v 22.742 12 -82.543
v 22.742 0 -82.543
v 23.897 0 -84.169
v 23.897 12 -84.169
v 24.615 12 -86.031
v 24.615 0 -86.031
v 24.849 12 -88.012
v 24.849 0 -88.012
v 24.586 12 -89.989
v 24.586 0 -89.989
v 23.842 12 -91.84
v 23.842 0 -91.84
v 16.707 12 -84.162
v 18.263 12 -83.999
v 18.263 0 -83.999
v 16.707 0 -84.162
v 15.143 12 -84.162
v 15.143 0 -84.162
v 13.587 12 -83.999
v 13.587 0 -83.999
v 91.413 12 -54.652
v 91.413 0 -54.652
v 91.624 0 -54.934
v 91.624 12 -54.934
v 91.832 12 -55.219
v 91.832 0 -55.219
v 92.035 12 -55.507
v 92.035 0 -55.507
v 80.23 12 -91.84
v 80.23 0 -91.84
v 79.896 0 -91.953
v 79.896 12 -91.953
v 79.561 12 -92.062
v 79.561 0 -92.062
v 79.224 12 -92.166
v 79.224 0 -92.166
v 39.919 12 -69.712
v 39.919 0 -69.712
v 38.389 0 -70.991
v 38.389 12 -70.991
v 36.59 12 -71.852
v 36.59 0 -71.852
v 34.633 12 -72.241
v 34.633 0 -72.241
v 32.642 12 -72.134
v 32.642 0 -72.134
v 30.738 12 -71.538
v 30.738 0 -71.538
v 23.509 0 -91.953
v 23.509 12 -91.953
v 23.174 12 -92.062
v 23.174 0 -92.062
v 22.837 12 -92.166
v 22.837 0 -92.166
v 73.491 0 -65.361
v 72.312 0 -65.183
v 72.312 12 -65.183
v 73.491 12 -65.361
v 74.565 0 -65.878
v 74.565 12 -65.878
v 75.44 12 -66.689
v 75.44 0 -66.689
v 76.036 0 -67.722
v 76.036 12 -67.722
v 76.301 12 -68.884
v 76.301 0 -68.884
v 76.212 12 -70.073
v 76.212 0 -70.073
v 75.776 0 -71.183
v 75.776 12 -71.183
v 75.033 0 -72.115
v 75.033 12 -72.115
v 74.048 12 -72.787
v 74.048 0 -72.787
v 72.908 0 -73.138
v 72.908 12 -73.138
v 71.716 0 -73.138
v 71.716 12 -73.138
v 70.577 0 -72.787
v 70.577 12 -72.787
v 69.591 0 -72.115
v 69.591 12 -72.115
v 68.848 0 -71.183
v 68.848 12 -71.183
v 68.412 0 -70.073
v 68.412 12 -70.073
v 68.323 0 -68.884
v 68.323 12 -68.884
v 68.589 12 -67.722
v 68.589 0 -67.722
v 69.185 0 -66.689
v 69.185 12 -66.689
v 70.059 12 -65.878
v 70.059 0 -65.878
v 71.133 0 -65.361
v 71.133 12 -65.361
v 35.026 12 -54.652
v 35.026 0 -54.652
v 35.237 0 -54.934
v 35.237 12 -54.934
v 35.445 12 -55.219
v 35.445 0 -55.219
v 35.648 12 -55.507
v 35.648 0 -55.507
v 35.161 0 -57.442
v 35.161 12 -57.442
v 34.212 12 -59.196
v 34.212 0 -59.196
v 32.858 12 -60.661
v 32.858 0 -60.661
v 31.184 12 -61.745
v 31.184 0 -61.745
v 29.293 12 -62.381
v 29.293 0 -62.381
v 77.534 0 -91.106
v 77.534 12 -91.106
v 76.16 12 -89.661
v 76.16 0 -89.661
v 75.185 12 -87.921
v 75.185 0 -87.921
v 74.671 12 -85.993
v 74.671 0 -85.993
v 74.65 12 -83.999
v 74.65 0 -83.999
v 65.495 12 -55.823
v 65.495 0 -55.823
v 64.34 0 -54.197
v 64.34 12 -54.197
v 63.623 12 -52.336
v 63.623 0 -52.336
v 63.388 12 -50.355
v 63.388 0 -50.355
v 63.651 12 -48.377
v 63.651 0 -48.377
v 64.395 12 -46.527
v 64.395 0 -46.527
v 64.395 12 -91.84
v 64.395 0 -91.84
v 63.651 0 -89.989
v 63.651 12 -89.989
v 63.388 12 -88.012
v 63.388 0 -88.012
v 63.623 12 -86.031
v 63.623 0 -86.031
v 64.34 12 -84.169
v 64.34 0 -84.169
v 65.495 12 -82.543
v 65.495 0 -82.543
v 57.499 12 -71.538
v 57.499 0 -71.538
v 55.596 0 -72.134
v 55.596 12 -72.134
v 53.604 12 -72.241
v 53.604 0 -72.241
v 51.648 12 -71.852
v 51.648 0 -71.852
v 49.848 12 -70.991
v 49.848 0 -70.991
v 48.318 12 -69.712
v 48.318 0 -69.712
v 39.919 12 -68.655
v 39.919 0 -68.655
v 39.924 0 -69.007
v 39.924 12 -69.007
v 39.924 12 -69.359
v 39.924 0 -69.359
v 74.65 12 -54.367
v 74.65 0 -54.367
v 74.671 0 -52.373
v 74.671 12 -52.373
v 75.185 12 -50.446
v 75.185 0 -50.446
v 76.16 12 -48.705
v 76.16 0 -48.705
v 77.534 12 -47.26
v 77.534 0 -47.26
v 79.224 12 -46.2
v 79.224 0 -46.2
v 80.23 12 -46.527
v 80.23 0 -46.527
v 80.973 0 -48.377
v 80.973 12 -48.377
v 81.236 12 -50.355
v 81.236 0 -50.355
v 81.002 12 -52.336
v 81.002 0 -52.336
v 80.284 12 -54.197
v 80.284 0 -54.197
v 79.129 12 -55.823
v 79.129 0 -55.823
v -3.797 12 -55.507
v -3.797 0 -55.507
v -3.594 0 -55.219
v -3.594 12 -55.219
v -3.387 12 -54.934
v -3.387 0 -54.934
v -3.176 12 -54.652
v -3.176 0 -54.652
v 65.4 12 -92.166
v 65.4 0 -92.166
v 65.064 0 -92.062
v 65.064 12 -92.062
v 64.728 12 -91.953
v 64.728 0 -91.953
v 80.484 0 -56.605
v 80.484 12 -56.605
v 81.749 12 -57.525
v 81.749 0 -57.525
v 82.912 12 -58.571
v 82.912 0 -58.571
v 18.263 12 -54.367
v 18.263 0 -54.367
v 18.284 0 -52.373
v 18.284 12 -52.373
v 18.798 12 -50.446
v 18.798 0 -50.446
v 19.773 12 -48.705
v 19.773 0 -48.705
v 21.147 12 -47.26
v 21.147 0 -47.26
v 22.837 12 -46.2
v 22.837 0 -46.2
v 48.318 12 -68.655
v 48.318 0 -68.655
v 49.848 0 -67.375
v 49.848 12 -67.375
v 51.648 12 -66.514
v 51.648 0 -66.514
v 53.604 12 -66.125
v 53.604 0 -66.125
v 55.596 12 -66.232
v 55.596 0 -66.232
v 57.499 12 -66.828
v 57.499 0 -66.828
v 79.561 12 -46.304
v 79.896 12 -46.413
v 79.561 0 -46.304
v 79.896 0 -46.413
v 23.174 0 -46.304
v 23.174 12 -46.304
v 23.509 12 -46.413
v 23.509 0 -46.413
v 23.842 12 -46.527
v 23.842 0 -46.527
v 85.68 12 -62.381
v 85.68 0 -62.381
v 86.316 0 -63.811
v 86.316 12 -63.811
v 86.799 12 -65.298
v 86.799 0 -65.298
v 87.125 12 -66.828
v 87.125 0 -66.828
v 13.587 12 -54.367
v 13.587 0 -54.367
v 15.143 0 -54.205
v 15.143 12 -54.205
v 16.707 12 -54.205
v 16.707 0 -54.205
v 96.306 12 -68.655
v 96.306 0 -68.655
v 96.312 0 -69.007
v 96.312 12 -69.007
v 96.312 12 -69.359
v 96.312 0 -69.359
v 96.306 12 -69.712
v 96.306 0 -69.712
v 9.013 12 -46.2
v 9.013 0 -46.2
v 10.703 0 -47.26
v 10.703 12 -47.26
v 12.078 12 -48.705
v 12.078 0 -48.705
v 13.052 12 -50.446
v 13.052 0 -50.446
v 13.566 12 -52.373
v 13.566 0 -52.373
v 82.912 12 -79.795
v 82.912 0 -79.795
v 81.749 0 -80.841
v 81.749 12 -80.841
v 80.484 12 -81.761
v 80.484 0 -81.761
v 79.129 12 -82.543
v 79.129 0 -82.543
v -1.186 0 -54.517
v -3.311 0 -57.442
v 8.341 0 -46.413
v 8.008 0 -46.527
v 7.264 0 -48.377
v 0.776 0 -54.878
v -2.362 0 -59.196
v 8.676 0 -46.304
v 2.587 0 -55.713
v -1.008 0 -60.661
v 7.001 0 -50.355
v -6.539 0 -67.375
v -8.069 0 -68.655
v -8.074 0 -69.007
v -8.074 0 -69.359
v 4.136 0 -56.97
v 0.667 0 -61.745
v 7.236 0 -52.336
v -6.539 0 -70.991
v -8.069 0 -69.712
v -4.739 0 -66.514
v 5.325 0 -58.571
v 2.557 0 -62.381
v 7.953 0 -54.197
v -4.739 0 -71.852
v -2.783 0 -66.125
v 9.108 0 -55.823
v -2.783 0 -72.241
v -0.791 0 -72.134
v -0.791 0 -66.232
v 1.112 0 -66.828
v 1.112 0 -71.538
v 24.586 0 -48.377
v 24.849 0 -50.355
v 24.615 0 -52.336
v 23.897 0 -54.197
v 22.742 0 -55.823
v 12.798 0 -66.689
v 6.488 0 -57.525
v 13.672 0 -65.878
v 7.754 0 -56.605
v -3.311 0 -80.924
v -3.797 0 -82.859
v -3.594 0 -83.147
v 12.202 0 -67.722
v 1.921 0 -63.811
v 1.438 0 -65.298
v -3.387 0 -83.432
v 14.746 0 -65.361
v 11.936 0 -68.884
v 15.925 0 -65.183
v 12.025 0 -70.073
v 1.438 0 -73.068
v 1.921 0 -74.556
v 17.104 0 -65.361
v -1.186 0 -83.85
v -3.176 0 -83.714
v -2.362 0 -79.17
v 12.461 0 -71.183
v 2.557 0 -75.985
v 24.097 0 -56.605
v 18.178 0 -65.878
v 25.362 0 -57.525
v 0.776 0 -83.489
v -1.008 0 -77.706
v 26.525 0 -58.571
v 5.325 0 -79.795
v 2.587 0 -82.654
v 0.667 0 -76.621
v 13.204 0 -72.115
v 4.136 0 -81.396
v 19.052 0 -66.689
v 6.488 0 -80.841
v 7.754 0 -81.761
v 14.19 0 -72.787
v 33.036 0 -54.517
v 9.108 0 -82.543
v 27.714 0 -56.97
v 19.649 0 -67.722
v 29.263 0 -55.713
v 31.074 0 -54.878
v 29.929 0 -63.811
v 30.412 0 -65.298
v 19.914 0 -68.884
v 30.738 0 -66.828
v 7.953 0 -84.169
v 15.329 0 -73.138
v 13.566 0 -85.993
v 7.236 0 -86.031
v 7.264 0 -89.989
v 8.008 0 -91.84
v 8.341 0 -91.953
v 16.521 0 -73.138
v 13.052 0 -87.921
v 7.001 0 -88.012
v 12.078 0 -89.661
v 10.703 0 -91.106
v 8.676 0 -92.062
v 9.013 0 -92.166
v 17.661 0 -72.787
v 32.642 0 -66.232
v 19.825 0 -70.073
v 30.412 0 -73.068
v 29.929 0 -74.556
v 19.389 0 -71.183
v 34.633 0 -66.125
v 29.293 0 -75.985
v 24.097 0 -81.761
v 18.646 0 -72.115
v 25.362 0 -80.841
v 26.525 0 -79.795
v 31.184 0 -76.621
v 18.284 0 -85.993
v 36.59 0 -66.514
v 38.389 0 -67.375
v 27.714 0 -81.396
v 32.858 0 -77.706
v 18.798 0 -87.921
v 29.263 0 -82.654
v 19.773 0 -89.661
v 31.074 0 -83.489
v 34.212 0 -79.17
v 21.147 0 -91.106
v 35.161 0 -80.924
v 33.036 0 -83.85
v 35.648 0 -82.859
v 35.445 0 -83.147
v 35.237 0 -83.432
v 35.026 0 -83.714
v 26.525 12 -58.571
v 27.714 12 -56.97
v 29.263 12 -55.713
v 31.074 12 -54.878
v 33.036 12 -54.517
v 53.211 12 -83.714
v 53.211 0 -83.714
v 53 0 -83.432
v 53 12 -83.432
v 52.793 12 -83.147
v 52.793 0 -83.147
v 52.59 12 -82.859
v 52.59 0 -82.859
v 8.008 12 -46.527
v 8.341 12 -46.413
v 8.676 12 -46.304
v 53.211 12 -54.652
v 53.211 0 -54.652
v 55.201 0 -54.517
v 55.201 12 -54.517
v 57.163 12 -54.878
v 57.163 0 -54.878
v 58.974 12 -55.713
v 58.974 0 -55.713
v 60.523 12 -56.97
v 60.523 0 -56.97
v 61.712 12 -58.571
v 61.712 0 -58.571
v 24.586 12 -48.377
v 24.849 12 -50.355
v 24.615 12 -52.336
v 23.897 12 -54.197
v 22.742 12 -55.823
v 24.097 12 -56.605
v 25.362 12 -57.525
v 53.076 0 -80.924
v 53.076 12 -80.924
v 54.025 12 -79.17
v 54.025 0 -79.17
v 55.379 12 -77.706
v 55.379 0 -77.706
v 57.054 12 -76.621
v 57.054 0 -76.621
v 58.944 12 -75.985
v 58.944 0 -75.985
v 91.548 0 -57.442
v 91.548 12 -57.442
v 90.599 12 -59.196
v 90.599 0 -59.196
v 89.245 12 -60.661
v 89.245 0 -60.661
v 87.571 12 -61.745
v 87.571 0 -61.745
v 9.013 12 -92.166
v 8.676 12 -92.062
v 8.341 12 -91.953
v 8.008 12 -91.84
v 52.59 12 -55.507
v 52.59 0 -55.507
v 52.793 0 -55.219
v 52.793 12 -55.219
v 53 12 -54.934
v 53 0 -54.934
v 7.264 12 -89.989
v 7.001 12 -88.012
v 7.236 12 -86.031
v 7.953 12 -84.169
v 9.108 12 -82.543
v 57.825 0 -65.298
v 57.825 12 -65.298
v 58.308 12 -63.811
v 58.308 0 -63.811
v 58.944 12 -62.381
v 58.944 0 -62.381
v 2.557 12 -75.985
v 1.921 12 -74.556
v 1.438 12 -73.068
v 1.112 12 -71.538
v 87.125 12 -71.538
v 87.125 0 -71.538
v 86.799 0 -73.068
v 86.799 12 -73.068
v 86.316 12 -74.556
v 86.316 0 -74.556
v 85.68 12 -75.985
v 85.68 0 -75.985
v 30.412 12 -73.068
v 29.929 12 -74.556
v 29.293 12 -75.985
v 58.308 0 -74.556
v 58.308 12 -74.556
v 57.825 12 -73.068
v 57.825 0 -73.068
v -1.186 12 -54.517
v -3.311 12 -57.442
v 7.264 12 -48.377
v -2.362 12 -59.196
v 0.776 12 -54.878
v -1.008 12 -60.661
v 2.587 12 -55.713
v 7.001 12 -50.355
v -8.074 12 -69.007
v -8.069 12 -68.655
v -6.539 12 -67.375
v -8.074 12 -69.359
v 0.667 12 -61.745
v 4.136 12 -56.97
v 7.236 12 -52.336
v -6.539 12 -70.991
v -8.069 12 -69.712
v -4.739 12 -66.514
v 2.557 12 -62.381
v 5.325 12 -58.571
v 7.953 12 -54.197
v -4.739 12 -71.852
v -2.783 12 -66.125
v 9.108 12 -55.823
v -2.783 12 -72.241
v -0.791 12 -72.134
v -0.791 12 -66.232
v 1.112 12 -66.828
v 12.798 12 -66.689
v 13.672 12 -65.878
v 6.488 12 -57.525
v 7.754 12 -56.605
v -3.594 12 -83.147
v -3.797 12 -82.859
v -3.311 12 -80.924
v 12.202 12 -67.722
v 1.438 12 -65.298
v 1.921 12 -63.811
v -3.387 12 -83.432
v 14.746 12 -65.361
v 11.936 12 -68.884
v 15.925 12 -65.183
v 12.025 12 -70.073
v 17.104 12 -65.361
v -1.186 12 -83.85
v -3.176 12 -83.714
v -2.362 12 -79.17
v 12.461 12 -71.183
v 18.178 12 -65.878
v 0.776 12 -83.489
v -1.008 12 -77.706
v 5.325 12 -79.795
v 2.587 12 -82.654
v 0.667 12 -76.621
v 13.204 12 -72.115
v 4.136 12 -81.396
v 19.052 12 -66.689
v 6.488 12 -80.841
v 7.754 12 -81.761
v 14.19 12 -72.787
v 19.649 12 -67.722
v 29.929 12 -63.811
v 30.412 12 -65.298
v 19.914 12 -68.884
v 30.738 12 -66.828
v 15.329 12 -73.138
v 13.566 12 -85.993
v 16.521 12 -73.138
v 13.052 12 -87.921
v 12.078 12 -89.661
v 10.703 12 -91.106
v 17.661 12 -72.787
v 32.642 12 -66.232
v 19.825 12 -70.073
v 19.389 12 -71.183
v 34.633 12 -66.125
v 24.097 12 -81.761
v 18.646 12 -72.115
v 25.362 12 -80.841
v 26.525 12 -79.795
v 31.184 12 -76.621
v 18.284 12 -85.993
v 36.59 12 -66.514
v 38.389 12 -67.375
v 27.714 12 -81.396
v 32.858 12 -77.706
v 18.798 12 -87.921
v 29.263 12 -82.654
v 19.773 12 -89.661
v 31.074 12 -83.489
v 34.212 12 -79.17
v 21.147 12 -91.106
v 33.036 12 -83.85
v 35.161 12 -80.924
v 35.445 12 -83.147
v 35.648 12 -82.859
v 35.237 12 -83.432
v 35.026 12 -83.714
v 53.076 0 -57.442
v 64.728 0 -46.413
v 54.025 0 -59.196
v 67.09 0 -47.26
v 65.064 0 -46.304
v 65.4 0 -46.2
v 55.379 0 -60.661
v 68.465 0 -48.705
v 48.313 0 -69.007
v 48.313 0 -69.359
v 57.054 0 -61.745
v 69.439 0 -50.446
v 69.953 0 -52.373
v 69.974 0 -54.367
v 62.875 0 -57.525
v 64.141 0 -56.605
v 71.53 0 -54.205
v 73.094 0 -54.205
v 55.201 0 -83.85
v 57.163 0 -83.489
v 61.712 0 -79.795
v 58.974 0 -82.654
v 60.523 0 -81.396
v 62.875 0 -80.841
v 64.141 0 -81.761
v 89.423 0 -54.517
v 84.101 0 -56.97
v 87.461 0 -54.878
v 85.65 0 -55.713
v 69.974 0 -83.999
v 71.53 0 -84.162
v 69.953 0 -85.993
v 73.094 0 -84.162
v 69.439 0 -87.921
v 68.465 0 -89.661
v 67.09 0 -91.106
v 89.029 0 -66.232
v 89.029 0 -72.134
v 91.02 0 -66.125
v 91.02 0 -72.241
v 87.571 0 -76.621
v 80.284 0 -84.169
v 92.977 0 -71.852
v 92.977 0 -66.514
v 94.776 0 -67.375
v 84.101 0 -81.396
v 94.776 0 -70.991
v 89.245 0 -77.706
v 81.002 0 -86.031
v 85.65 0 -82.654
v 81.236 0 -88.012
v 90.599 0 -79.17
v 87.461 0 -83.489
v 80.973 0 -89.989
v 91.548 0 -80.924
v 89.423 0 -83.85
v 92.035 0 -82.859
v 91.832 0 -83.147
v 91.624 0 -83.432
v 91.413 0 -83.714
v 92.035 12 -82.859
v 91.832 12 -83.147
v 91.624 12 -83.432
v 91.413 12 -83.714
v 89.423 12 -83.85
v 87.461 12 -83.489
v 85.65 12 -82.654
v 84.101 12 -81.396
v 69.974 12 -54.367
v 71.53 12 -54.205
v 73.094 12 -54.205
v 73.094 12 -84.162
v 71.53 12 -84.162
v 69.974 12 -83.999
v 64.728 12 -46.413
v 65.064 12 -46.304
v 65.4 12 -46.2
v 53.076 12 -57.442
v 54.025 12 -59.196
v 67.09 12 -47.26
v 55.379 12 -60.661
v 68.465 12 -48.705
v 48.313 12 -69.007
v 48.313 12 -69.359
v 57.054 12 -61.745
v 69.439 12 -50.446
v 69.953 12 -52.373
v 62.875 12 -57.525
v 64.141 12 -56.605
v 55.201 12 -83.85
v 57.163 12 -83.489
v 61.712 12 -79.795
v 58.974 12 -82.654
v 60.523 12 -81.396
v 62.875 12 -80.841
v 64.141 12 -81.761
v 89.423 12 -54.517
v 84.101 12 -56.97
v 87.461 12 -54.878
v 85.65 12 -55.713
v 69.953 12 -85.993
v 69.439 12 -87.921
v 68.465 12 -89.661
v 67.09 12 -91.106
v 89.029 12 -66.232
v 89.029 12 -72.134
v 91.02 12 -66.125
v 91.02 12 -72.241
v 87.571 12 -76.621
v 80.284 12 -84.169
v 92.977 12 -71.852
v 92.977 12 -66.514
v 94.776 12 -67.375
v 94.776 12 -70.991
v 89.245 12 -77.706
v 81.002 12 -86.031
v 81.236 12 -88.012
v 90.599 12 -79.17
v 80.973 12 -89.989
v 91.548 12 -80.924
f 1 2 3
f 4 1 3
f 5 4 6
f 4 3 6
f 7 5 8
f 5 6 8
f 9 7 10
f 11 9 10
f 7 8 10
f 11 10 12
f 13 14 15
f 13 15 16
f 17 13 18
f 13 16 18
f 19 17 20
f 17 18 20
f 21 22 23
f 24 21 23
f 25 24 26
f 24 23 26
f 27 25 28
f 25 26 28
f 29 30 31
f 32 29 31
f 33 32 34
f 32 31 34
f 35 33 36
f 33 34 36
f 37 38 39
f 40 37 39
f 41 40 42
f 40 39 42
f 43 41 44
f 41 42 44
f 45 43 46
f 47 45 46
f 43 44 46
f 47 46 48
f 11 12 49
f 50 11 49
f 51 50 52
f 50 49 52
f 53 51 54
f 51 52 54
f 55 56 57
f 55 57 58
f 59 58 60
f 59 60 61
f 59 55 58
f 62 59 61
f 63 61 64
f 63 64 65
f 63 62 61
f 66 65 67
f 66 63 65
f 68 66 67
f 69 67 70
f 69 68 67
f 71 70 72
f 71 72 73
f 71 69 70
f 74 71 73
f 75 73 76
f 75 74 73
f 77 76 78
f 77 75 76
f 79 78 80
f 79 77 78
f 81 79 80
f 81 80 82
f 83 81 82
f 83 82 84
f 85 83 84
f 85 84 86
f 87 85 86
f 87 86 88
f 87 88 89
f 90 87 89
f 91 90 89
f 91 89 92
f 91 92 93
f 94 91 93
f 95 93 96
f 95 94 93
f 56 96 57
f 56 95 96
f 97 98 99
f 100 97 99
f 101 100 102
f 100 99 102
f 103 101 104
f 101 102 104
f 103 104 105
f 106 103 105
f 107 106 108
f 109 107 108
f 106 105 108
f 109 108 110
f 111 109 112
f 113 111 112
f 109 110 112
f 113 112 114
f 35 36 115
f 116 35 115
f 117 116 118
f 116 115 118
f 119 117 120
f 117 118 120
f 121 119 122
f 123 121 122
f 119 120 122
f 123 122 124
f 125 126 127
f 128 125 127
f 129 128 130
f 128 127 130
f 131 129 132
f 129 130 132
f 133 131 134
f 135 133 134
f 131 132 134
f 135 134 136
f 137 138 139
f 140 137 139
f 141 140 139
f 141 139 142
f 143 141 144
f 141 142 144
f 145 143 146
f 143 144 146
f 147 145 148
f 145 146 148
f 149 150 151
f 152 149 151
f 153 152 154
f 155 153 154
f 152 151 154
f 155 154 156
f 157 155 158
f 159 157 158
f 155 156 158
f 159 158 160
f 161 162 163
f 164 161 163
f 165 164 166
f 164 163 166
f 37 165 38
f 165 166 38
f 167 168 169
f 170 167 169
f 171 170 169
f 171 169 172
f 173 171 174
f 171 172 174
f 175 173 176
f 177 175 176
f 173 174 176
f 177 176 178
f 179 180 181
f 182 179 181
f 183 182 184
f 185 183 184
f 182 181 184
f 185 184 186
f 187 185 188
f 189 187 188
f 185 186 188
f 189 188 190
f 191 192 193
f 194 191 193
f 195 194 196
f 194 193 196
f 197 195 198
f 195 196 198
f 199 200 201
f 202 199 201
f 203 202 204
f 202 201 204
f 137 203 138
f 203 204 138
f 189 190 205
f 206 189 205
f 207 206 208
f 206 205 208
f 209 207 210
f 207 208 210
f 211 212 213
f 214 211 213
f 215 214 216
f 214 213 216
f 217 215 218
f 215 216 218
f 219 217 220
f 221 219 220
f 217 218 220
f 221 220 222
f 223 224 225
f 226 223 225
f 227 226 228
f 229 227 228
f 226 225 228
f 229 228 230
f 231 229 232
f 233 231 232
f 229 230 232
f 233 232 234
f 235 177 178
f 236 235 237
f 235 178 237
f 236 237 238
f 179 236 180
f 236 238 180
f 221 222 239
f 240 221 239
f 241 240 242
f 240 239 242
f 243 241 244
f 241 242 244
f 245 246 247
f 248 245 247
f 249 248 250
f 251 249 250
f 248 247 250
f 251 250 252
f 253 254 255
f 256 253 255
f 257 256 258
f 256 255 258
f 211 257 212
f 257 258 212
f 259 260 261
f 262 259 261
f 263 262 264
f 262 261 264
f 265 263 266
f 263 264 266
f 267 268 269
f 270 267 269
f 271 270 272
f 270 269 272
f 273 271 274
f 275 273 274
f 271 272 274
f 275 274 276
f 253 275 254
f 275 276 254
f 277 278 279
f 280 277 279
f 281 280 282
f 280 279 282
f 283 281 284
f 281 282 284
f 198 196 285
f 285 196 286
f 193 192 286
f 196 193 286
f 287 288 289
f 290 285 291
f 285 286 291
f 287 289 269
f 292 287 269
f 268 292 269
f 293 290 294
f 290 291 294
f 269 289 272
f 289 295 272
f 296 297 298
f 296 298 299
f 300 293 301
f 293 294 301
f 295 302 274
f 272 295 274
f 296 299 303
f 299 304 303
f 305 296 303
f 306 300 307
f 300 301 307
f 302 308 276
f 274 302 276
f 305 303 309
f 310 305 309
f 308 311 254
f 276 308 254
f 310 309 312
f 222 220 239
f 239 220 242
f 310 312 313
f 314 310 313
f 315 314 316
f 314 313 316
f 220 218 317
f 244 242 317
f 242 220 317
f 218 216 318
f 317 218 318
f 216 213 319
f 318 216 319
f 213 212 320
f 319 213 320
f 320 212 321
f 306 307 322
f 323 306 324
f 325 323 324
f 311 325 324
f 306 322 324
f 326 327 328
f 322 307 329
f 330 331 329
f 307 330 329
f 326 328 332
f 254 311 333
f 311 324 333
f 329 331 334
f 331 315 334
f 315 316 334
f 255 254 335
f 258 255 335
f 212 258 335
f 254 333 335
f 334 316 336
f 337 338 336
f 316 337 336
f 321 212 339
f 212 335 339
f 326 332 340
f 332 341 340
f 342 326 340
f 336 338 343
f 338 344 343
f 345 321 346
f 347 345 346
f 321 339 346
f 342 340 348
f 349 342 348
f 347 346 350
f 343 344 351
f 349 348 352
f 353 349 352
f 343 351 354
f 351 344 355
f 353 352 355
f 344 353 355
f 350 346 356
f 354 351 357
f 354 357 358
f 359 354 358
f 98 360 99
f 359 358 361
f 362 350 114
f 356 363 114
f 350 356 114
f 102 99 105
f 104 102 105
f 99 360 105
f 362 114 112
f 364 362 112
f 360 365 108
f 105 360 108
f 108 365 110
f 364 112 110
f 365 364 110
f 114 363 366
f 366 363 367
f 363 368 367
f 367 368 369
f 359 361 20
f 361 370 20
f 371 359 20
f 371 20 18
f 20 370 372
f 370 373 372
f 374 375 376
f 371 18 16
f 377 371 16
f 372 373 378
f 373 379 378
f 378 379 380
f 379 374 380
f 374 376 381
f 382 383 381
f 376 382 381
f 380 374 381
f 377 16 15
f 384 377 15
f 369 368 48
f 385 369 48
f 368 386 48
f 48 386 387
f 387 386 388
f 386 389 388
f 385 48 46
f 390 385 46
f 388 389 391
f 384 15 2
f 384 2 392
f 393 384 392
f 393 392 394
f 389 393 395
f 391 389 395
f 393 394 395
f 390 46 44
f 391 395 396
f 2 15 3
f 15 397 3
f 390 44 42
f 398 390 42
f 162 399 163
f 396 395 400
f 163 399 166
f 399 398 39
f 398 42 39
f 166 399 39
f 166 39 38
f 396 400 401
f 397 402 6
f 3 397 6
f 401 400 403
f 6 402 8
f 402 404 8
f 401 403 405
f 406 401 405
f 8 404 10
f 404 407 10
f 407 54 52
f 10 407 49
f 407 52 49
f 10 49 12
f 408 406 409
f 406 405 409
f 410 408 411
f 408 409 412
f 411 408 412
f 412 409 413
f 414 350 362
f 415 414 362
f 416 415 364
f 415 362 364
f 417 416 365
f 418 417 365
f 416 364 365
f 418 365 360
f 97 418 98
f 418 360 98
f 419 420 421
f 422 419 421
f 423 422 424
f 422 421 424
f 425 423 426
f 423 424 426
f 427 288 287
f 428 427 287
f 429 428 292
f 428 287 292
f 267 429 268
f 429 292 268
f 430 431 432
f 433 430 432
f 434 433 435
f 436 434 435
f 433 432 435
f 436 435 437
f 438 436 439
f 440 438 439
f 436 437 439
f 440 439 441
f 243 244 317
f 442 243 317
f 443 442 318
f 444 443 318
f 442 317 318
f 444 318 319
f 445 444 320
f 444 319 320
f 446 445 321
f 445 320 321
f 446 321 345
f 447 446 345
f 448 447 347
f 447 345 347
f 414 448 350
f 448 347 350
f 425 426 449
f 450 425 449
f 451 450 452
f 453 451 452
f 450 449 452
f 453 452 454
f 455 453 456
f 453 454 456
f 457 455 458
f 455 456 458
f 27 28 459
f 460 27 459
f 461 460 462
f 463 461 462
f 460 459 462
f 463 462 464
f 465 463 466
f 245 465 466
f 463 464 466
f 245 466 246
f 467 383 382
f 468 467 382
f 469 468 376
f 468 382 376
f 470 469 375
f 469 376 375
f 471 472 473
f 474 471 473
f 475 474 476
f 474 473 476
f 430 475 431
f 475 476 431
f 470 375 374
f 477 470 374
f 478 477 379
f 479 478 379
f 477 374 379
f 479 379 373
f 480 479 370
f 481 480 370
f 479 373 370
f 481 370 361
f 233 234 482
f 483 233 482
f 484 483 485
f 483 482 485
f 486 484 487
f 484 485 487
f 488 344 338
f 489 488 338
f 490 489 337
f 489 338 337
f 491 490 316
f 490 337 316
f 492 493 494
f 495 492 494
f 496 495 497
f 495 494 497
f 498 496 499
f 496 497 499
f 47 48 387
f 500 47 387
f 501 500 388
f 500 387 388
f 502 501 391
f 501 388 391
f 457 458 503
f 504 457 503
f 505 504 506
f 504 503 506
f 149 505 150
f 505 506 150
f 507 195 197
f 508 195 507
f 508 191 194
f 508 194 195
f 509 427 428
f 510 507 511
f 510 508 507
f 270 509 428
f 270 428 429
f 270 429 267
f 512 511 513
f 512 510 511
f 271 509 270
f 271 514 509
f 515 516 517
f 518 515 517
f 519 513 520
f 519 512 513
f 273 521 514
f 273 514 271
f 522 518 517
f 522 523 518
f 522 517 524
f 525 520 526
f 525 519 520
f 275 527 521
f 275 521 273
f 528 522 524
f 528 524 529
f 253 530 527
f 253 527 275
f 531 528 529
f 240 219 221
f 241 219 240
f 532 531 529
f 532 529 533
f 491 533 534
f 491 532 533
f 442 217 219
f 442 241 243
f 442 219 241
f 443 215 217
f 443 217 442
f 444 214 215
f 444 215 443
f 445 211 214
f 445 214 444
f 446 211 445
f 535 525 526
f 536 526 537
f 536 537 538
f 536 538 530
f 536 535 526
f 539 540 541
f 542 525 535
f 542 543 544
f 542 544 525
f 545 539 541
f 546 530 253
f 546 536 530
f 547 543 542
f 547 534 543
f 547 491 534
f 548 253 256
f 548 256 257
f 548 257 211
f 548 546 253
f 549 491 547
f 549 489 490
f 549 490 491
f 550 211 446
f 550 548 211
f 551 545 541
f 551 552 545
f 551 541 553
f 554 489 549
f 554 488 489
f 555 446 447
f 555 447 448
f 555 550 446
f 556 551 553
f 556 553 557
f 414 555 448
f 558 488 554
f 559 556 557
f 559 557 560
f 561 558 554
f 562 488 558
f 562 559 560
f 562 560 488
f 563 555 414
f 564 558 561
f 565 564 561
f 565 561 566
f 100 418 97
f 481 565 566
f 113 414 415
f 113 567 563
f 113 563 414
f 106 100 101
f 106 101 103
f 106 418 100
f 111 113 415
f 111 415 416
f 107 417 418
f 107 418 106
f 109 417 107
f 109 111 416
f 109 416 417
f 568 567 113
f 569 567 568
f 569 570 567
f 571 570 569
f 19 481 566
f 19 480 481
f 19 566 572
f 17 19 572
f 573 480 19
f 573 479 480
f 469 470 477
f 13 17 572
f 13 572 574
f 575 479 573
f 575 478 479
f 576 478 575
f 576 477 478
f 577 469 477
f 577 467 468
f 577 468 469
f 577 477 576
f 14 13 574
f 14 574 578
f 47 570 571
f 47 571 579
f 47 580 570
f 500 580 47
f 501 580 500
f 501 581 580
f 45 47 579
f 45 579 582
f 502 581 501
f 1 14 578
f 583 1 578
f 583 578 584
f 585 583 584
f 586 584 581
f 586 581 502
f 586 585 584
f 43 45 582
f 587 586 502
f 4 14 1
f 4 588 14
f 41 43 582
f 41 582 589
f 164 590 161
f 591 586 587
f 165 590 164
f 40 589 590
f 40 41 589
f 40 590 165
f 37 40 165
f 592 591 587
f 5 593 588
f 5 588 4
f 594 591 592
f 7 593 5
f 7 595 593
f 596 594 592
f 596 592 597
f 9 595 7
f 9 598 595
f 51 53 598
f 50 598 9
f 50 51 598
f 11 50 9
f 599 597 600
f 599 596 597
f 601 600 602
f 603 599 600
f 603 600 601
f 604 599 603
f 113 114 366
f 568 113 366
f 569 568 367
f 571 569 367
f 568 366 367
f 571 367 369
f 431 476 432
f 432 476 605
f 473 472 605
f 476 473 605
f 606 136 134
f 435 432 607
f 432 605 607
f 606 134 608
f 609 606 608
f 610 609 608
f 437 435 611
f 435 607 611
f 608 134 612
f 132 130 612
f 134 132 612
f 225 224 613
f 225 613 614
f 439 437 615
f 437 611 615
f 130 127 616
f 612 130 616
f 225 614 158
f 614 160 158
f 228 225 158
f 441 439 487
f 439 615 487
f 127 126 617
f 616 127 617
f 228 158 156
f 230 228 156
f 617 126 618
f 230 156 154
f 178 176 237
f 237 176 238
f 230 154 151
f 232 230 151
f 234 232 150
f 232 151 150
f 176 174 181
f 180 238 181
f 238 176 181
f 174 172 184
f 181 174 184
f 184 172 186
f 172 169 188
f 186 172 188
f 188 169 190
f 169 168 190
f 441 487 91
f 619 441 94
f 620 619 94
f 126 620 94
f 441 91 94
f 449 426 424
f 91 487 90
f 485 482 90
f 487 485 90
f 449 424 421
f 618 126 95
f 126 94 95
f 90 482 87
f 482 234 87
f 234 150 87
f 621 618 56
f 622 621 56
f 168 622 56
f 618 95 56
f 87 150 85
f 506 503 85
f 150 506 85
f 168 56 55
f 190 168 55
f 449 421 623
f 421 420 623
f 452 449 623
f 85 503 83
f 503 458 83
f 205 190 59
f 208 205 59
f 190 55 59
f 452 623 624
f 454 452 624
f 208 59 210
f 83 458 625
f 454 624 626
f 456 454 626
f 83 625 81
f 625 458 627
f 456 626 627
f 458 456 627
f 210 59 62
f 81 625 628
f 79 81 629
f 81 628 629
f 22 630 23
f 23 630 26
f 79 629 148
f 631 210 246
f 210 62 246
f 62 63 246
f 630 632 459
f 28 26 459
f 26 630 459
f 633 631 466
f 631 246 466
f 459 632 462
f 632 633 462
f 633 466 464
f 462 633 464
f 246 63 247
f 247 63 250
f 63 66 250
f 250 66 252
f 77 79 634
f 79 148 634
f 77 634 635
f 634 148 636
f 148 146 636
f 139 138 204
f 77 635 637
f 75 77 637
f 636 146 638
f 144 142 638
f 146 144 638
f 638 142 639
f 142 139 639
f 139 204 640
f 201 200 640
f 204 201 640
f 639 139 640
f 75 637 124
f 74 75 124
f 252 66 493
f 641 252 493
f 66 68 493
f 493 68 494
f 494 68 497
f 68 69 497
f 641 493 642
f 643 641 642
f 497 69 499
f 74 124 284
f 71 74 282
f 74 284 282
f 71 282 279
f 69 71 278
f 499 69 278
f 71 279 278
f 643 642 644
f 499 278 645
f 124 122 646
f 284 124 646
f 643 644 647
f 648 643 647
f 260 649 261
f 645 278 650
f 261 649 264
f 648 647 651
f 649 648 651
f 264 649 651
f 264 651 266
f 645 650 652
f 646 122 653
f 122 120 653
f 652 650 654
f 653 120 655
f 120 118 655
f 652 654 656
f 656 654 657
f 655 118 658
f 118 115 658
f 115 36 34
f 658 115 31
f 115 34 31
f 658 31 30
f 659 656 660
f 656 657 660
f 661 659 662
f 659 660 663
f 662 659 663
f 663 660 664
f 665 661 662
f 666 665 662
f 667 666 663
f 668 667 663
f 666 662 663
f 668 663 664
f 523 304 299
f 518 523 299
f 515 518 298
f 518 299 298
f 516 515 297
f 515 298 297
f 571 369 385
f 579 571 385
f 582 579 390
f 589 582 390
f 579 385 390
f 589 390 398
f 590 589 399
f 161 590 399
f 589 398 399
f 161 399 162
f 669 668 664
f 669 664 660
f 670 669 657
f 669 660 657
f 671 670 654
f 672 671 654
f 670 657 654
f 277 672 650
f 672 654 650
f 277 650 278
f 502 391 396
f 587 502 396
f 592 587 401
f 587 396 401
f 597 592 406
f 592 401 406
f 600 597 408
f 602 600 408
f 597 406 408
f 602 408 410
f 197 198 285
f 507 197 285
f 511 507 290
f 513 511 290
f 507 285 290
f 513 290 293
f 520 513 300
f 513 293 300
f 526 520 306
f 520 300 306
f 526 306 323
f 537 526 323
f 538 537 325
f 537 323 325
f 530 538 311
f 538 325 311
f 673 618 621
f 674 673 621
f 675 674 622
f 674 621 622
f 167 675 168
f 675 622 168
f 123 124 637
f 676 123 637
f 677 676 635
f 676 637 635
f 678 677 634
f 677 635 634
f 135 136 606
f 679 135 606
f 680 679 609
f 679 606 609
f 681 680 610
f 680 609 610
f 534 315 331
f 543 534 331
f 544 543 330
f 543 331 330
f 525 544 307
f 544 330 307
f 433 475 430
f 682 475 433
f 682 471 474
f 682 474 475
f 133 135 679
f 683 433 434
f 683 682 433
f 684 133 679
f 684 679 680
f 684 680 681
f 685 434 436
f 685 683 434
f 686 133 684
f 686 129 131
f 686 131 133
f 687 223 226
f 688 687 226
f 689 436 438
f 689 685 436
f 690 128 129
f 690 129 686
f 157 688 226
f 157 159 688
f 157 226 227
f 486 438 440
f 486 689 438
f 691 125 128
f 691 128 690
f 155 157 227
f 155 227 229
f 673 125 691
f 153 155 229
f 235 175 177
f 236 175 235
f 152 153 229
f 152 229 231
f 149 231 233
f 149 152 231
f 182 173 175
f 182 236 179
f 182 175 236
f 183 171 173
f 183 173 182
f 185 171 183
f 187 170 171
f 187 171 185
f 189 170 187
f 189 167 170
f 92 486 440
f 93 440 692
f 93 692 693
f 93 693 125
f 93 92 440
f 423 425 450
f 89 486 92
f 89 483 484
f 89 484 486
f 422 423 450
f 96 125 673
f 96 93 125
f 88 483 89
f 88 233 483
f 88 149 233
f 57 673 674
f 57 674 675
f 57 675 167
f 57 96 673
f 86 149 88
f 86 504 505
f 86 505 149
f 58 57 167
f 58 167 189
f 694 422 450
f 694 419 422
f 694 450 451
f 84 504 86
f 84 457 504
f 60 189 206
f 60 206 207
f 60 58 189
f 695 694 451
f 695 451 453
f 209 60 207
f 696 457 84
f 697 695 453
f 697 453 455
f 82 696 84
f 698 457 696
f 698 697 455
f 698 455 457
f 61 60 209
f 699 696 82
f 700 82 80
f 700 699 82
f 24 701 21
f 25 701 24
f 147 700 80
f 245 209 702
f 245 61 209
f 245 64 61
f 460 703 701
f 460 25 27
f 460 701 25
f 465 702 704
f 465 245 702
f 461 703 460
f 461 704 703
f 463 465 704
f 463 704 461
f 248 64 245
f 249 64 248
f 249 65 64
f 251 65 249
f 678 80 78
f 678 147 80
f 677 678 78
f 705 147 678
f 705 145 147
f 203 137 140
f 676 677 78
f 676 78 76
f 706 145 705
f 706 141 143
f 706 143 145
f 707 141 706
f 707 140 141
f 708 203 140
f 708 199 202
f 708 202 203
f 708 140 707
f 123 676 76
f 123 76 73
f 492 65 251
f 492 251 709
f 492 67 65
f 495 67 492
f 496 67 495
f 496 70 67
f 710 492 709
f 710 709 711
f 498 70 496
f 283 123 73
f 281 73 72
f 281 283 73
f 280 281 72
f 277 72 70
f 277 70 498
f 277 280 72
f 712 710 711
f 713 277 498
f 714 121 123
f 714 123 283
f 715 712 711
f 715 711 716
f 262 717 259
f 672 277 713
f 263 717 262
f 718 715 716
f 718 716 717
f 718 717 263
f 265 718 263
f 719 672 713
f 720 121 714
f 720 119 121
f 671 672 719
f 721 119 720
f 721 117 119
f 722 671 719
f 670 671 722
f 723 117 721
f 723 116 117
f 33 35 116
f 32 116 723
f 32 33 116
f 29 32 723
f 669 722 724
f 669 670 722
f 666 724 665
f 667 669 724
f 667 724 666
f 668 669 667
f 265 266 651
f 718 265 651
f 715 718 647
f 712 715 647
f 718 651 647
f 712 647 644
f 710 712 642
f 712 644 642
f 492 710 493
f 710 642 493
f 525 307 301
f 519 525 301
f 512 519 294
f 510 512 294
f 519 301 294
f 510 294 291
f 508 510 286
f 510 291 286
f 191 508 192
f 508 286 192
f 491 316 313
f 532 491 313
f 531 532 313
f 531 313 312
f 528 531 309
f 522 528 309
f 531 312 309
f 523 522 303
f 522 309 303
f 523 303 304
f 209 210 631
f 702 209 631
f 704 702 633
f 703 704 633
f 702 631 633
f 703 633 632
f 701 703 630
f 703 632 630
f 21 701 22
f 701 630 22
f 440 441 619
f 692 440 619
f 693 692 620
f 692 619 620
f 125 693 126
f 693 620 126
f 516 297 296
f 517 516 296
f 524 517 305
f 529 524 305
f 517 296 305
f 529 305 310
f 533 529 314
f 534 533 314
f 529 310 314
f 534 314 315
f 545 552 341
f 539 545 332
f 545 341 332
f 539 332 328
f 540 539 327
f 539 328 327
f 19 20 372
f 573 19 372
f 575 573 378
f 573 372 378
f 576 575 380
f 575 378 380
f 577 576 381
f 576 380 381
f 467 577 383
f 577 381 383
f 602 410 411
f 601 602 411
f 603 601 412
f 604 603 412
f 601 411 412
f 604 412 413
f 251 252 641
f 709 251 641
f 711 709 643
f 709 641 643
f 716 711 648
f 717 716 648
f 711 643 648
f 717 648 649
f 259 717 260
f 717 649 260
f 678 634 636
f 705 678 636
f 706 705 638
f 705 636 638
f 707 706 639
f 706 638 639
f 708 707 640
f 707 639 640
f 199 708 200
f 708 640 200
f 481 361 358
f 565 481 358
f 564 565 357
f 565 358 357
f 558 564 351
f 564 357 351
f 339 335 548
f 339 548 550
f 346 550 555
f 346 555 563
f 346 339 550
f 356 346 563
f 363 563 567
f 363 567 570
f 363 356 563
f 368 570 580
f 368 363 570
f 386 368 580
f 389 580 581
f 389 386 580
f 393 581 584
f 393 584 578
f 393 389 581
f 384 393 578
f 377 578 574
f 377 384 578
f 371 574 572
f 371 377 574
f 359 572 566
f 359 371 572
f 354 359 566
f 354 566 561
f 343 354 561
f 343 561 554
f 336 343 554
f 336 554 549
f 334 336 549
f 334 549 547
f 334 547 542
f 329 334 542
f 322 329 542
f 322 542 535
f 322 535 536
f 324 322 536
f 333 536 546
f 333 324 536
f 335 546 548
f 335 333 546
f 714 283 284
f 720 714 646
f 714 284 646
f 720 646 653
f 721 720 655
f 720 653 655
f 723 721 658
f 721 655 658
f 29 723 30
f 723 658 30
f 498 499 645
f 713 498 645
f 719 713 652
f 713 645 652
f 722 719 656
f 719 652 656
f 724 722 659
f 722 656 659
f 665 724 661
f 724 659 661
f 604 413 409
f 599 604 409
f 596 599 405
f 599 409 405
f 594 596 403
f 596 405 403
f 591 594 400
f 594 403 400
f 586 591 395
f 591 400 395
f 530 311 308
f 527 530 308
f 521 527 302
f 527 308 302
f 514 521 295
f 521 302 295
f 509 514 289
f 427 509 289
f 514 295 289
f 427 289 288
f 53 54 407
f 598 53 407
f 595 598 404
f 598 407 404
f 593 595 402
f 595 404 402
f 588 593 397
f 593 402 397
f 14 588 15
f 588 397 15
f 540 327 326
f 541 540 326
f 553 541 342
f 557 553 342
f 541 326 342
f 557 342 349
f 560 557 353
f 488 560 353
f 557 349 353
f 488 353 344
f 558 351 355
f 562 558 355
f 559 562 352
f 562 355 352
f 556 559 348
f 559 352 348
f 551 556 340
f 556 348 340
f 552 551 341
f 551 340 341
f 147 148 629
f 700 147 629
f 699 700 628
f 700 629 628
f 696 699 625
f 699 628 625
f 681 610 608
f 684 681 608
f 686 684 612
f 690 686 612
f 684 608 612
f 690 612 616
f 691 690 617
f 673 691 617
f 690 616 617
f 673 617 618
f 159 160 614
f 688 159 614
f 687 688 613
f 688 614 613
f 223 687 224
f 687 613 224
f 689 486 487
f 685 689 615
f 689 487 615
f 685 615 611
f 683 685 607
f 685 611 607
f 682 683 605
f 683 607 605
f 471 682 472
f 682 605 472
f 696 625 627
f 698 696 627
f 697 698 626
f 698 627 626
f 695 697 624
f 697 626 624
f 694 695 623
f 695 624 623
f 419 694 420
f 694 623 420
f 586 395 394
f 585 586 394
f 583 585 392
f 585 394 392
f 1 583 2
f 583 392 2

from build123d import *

# Parameters (mm, degrees)
SKETCH2_R             = 4
BOSS_EXTRUDE1_DEPTH   = 12
BOSS_EXTRUDE1_2_DEPTH = 12


with BuildPart() as part:
    # Sketch2 → Boss-Extrude1 (new body)
    with BuildSketch(Plane(origin=(0, 0, 0), x_dir=(1, 0, 0), z_dir=(0, 1, 0))):
        with BuildLine():
            ThreePointArc((39.91929142, 68.654507651), (39.925113633, 69.183121198), (39.91929142, 69.711734744))
            ThreePointArc((39.91929142, 69.711734744), (35.623678248, 72.107813998), (30.738130346, 71.537805219))
            ThreePointArc((30.738130346, 71.537805219), (30.19001032, 73.818067096), (29.293144433, 75.985014574))
            ThreePointArc((29.293144433, 75.985014574), (33.580678467, 78.395520792), (35.647522476, 82.8588877))
            ThreePointArc((35.647522476, 82.8588877), (35.341521498, 83.289967253), (35.026099982, 83.714202385))
            ThreePointArc((35.026099982, 83.714202385), (30.142495876, 83.127773149), (26.52504735, 79.794973354))
            ThreePointArc((26.52504735, 79.794973354), (24.741304632, 81.317567096), (22.742025117, 82.54349989))
            ThreePointArc((22.742025117, 82.54349989), (24.793853009, 87.013789659), (23.842463693, 91.839589767))
            ThreePointArc((23.842463693, 91.839589767), (23.341521498, 92.008477589), (22.836980977, 92.166290906))
            ThreePointArc((22.836980977, 92.166290906), (19.230756718, 88.821349216), (18.263149953, 83.998774648))
            ThreePointArc((18.263149953, 83.998774648), (15.925113633, 84.182121198), (13.587077312, 83.998774648))
            ThreePointArc((13.587077312, 83.998774648), (12.619470547, 88.821349216), (9.013246288, 92.166290906))
            ThreePointArc((9.013246288, 92.166290906), (8.508705768, 92.008477589), (8.007763572, 91.839589767))
            ThreePointArc((8.007763572, 91.839589767), (7.056374256, 87.013789659), (9.108202148, 82.54349989))
            ThreePointArc((9.108202148, 82.54349989), (7.108922633, 81.317567097), (5.325179915, 79.794973354))
            ThreePointArc((5.325179915, 79.794973354), (1.707731389, 83.127773149), (-3.175872717, 83.714202385))
            ThreePointArc((-3.175872717, 83.714202385), (-3.491294233, 83.289967253), (-3.797295211, 82.8588877))
            ThreePointArc((-3.797295211, 82.8588877), (-1.730451202, 78.395520792), (2.557082832, 75.985014575))
            ThreePointArc((2.557082832, 75.985014575), (1.660216945, 73.818067097), (1.112096919, 71.537805219))
            ThreePointArc((1.112096919, 71.537805219), (-3.773450983, 72.107813998), (-8.069064155, 69.711734744))
            ThreePointArc((-8.069064155, 69.711734744), (-8.074886368, 69.183121198), (-8.069064155, 68.654507651))
            ThreePointArc((-8.069064155, 68.654507651), (-3.773450983, 66.258428398), (1.112096919, 66.828437177))
            ThreePointArc((1.112096919, 66.828437177), (1.660216945, 64.548175299), (2.557082832, 62.381227821))
            ThreePointArc((2.557082832, 62.381227821), (-1.730451202, 59.970721604), (-3.797295211, 55.507354696))
            ThreePointArc((-3.797295211, 55.507354696), (-3.491294233, 55.076275143), (-3.175872717, 54.652040011))
            ThreePointArc((-3.175872717, 54.652040011), (1.707731389, 55.238469247), (5.325179915, 58.571269042))
            ThreePointArc((5.325179915, 58.571269042), (7.108922633, 57.048675299), (9.108202148, 55.822742505))
            ThreePointArc((9.108202148, 55.822742505), (7.056374256, 51.352452737), (8.007763572, 46.526652629))
            ThreePointArc((8.007763572, 46.526652629), (8.508705768, 46.357764807), (9.013246288, 46.19995149))
            ThreePointArc((9.013246288, 46.19995149), (12.619470547, 49.54489318), (13.587077312, 54.367467747))
            ThreePointArc((13.587077312, 54.367467747), (15.925113633, 54.184121198), (18.263149953, 54.367467747))
            ThreePointArc((18.263149953, 54.367467747), (19.230756718, 49.54489318), (22.836980977, 46.19995149))
            ThreePointArc((22.836980977, 46.19995149), (23.341521498, 46.357764807), (23.842463693, 46.526652629))
            ThreePointArc((23.842463693, 46.526652629), (24.793853009, 51.352452737), (22.742025117, 55.822742505))
            ThreePointArc((22.742025117, 55.822742505), (24.741304632, 57.048675299), (26.52504735, 58.571269042))
            ThreePointArc((26.52504735, 58.571269042), (30.142495876, 55.238469247), (35.026099982, 54.652040011))
            ThreePointArc((35.026099982, 54.652040011), (35.341521498, 55.076275143), (35.647522476, 55.507354696))
            ThreePointArc((35.647522476, 55.507354696), (33.580678467, 59.970721604), (29.293144433, 62.381227821))
            ThreePointArc((29.293144433, 62.381227821), (30.19001032, 64.548175299), (30.738130346, 66.828437177))
            ThreePointArc((30.738130346, 66.828437177), (35.623678248, 66.258428398), (39.91929142, 68.654507651))
        make_face()
        with Locations(Location((15.925113633, 69.183121198, 0), (0, 0, 270))):  # turned: the seam where the file's is
            Circle(SKETCH2_R, mode=Mode.SUBTRACT)
    extrude(amount=BOSS_EXTRUDE1_DEPTH)


with BuildPart() as body_2:
    # Sketch2 → Boss-Extrude1 2 (new body)
    with BuildSketch(Plane(origin=(0, 0, 0), x_dir=(1, 0, 0), z_dir=(0, 1, 0))):
        with BuildLine():
            ThreePointArc((96.30636676, 68.654507651), (96.312188972, 69.183121198), (96.30636676, 69.711734744))
            ThreePointArc((96.30636676, 69.711734744), (92.010753588, 72.107813998), (87.125205686, 71.537805219))
            ThreePointArc((87.125205686, 71.537805219), (86.57708566, 73.818067096), (85.680219773, 75.985014574))
            ThreePointArc((85.680219773, 75.985014574), (89.967753806, 78.395520792), (92.034597815, 82.8588877))
            ThreePointArc((92.034597815, 82.8588877), (91.728596837, 83.289967253), (91.413175321, 83.714202385))
            ThreePointArc((91.413175321, 83.714202385), (86.529571216, 83.127773149), (82.91212269, 79.794973354))
            ThreePointArc((82.91212269, 79.794973354), (81.128379971, 81.317567096), (79.129100457, 82.54349989))
            ThreePointArc((79.129100457, 82.54349989), (81.180928348, 87.013789659), (80.229539032, 91.839589767))
            ThreePointArc((80.229539032, 91.839589767), (79.728596837, 92.008477589), (79.224056316, 92.166290906))
            ThreePointArc((79.224056316, 92.166290906), (75.617832057, 88.821349216), (74.650225292, 83.998774648))
            ThreePointArc((74.650225292, 83.998774648), (72.312188972, 84.182121198), (69.974152652, 83.998774648))
            ThreePointArc((69.974152652, 83.998774648), (69.006545886, 88.821349216), (65.400321627, 92.166290906))
            ThreePointArc((65.400321627, 92.166290906), (64.895781107, 92.008477589), (64.394838911, 91.839589767))
            ThreePointArc((64.394838911, 91.839589767), (63.443449595, 87.013789659), (65.495277487, 82.54349989))
            ThreePointArc((65.495277487, 82.54349989), (63.495997973, 81.317567097), (61.712255254, 79.794973354))
            ThreePointArc((61.712255254, 79.794973354), (58.094806728, 83.127773149), (53.211202622, 83.714202385))
            ThreePointArc((53.211202622, 83.714202385), (52.895781107, 83.289967253), (52.589780128, 82.8588877))
            ThreePointArc((52.589780128, 82.8588877), (54.656624137, 78.395520792), (58.944158171, 75.985014575))
            ThreePointArc((58.944158171, 75.985014575), (58.047292284, 73.818067097), (57.499172258, 71.537805219))
            ThreePointArc((57.499172258, 71.537805219), (52.613624356, 72.107813998), (48.318011184, 69.711734744))
            ThreePointArc((48.318011184, 69.711734744), (48.312188972, 69.183121198), (48.318011184, 68.654507651))
            ThreePointArc((48.318011184, 68.654507651), (52.613624356, 66.258428398), (57.499172258, 66.828437177))
            ThreePointArc((57.499172258, 66.828437177), (58.047292284, 64.548175299), (58.944158171, 62.381227821))
            ThreePointArc((58.944158171, 62.381227821), (54.656624137, 59.970721604), (52.589780128, 55.507354696))
            ThreePointArc((52.589780128, 55.507354696), (52.895781107, 55.076275143), (53.211202622, 54.652040011))
            ThreePointArc((53.211202622, 54.652040011), (58.094806728, 55.238469247), (61.712255254, 58.571269042))
            ThreePointArc((61.712255254, 58.571269042), (63.495997973, 57.048675299), (65.495277487, 55.822742505))
            ThreePointArc((65.495277487, 55.822742505), (63.443449595, 51.352452737), (64.394838911, 46.526652629))
            ThreePointArc((64.394838911, 46.526652629), (64.895781107, 46.357764807), (65.400321627, 46.19995149))
            ThreePointArc((65.400321627, 46.19995149), (69.006545886, 49.54489318), (69.974152652, 54.367467747))
            ThreePointArc((69.974152652, 54.367467747), (72.312188972, 54.184121198), (74.650225292, 54.367467747))
            ThreePointArc((74.650225292, 54.367467747), (75.617832058, 49.54489318), (79.224056316, 46.19995149))
            ThreePointArc((79.224056316, 46.19995149), (79.728596837, 46.357764807), (80.229539032, 46.526652629))
            ThreePointArc((80.229539032, 46.526652629), (81.180928348, 51.352452737), (79.129100457, 55.822742505))
            ThreePointArc((79.129100457, 55.822742505), (81.128379971, 57.048675299), (82.91212269, 58.571269042))
            ThreePointArc((82.91212269, 58.571269042), (86.529571216, 55.238469247), (91.413175322, 54.652040011))
            ThreePointArc((91.413175322, 54.652040011), (91.728596837, 55.076275143), (92.034597815, 55.507354696))
            ThreePointArc((92.034597815, 55.507354696), (89.967753806, 59.970721604), (85.680219773, 62.381227821))
            ThreePointArc((85.680219773, 62.381227821), (86.57708566, 64.548175299), (87.125205686, 66.828437177))
            ThreePointArc((87.125205686, 66.828437177), (92.010753588, 66.258428398), (96.30636676, 68.654507651))
        make_face()
        with Locations(Location((72.312188972, 69.183121198, 0), (0, 0, 270))):  # turned: the seam where the file's is
            Circle(SKETCH2_R, mode=Mode.SUBTRACT)
    extrude(amount=BOSS_EXTRUDE1_2_DEPTH)


solid = Compound([part.part, body_2.part])
